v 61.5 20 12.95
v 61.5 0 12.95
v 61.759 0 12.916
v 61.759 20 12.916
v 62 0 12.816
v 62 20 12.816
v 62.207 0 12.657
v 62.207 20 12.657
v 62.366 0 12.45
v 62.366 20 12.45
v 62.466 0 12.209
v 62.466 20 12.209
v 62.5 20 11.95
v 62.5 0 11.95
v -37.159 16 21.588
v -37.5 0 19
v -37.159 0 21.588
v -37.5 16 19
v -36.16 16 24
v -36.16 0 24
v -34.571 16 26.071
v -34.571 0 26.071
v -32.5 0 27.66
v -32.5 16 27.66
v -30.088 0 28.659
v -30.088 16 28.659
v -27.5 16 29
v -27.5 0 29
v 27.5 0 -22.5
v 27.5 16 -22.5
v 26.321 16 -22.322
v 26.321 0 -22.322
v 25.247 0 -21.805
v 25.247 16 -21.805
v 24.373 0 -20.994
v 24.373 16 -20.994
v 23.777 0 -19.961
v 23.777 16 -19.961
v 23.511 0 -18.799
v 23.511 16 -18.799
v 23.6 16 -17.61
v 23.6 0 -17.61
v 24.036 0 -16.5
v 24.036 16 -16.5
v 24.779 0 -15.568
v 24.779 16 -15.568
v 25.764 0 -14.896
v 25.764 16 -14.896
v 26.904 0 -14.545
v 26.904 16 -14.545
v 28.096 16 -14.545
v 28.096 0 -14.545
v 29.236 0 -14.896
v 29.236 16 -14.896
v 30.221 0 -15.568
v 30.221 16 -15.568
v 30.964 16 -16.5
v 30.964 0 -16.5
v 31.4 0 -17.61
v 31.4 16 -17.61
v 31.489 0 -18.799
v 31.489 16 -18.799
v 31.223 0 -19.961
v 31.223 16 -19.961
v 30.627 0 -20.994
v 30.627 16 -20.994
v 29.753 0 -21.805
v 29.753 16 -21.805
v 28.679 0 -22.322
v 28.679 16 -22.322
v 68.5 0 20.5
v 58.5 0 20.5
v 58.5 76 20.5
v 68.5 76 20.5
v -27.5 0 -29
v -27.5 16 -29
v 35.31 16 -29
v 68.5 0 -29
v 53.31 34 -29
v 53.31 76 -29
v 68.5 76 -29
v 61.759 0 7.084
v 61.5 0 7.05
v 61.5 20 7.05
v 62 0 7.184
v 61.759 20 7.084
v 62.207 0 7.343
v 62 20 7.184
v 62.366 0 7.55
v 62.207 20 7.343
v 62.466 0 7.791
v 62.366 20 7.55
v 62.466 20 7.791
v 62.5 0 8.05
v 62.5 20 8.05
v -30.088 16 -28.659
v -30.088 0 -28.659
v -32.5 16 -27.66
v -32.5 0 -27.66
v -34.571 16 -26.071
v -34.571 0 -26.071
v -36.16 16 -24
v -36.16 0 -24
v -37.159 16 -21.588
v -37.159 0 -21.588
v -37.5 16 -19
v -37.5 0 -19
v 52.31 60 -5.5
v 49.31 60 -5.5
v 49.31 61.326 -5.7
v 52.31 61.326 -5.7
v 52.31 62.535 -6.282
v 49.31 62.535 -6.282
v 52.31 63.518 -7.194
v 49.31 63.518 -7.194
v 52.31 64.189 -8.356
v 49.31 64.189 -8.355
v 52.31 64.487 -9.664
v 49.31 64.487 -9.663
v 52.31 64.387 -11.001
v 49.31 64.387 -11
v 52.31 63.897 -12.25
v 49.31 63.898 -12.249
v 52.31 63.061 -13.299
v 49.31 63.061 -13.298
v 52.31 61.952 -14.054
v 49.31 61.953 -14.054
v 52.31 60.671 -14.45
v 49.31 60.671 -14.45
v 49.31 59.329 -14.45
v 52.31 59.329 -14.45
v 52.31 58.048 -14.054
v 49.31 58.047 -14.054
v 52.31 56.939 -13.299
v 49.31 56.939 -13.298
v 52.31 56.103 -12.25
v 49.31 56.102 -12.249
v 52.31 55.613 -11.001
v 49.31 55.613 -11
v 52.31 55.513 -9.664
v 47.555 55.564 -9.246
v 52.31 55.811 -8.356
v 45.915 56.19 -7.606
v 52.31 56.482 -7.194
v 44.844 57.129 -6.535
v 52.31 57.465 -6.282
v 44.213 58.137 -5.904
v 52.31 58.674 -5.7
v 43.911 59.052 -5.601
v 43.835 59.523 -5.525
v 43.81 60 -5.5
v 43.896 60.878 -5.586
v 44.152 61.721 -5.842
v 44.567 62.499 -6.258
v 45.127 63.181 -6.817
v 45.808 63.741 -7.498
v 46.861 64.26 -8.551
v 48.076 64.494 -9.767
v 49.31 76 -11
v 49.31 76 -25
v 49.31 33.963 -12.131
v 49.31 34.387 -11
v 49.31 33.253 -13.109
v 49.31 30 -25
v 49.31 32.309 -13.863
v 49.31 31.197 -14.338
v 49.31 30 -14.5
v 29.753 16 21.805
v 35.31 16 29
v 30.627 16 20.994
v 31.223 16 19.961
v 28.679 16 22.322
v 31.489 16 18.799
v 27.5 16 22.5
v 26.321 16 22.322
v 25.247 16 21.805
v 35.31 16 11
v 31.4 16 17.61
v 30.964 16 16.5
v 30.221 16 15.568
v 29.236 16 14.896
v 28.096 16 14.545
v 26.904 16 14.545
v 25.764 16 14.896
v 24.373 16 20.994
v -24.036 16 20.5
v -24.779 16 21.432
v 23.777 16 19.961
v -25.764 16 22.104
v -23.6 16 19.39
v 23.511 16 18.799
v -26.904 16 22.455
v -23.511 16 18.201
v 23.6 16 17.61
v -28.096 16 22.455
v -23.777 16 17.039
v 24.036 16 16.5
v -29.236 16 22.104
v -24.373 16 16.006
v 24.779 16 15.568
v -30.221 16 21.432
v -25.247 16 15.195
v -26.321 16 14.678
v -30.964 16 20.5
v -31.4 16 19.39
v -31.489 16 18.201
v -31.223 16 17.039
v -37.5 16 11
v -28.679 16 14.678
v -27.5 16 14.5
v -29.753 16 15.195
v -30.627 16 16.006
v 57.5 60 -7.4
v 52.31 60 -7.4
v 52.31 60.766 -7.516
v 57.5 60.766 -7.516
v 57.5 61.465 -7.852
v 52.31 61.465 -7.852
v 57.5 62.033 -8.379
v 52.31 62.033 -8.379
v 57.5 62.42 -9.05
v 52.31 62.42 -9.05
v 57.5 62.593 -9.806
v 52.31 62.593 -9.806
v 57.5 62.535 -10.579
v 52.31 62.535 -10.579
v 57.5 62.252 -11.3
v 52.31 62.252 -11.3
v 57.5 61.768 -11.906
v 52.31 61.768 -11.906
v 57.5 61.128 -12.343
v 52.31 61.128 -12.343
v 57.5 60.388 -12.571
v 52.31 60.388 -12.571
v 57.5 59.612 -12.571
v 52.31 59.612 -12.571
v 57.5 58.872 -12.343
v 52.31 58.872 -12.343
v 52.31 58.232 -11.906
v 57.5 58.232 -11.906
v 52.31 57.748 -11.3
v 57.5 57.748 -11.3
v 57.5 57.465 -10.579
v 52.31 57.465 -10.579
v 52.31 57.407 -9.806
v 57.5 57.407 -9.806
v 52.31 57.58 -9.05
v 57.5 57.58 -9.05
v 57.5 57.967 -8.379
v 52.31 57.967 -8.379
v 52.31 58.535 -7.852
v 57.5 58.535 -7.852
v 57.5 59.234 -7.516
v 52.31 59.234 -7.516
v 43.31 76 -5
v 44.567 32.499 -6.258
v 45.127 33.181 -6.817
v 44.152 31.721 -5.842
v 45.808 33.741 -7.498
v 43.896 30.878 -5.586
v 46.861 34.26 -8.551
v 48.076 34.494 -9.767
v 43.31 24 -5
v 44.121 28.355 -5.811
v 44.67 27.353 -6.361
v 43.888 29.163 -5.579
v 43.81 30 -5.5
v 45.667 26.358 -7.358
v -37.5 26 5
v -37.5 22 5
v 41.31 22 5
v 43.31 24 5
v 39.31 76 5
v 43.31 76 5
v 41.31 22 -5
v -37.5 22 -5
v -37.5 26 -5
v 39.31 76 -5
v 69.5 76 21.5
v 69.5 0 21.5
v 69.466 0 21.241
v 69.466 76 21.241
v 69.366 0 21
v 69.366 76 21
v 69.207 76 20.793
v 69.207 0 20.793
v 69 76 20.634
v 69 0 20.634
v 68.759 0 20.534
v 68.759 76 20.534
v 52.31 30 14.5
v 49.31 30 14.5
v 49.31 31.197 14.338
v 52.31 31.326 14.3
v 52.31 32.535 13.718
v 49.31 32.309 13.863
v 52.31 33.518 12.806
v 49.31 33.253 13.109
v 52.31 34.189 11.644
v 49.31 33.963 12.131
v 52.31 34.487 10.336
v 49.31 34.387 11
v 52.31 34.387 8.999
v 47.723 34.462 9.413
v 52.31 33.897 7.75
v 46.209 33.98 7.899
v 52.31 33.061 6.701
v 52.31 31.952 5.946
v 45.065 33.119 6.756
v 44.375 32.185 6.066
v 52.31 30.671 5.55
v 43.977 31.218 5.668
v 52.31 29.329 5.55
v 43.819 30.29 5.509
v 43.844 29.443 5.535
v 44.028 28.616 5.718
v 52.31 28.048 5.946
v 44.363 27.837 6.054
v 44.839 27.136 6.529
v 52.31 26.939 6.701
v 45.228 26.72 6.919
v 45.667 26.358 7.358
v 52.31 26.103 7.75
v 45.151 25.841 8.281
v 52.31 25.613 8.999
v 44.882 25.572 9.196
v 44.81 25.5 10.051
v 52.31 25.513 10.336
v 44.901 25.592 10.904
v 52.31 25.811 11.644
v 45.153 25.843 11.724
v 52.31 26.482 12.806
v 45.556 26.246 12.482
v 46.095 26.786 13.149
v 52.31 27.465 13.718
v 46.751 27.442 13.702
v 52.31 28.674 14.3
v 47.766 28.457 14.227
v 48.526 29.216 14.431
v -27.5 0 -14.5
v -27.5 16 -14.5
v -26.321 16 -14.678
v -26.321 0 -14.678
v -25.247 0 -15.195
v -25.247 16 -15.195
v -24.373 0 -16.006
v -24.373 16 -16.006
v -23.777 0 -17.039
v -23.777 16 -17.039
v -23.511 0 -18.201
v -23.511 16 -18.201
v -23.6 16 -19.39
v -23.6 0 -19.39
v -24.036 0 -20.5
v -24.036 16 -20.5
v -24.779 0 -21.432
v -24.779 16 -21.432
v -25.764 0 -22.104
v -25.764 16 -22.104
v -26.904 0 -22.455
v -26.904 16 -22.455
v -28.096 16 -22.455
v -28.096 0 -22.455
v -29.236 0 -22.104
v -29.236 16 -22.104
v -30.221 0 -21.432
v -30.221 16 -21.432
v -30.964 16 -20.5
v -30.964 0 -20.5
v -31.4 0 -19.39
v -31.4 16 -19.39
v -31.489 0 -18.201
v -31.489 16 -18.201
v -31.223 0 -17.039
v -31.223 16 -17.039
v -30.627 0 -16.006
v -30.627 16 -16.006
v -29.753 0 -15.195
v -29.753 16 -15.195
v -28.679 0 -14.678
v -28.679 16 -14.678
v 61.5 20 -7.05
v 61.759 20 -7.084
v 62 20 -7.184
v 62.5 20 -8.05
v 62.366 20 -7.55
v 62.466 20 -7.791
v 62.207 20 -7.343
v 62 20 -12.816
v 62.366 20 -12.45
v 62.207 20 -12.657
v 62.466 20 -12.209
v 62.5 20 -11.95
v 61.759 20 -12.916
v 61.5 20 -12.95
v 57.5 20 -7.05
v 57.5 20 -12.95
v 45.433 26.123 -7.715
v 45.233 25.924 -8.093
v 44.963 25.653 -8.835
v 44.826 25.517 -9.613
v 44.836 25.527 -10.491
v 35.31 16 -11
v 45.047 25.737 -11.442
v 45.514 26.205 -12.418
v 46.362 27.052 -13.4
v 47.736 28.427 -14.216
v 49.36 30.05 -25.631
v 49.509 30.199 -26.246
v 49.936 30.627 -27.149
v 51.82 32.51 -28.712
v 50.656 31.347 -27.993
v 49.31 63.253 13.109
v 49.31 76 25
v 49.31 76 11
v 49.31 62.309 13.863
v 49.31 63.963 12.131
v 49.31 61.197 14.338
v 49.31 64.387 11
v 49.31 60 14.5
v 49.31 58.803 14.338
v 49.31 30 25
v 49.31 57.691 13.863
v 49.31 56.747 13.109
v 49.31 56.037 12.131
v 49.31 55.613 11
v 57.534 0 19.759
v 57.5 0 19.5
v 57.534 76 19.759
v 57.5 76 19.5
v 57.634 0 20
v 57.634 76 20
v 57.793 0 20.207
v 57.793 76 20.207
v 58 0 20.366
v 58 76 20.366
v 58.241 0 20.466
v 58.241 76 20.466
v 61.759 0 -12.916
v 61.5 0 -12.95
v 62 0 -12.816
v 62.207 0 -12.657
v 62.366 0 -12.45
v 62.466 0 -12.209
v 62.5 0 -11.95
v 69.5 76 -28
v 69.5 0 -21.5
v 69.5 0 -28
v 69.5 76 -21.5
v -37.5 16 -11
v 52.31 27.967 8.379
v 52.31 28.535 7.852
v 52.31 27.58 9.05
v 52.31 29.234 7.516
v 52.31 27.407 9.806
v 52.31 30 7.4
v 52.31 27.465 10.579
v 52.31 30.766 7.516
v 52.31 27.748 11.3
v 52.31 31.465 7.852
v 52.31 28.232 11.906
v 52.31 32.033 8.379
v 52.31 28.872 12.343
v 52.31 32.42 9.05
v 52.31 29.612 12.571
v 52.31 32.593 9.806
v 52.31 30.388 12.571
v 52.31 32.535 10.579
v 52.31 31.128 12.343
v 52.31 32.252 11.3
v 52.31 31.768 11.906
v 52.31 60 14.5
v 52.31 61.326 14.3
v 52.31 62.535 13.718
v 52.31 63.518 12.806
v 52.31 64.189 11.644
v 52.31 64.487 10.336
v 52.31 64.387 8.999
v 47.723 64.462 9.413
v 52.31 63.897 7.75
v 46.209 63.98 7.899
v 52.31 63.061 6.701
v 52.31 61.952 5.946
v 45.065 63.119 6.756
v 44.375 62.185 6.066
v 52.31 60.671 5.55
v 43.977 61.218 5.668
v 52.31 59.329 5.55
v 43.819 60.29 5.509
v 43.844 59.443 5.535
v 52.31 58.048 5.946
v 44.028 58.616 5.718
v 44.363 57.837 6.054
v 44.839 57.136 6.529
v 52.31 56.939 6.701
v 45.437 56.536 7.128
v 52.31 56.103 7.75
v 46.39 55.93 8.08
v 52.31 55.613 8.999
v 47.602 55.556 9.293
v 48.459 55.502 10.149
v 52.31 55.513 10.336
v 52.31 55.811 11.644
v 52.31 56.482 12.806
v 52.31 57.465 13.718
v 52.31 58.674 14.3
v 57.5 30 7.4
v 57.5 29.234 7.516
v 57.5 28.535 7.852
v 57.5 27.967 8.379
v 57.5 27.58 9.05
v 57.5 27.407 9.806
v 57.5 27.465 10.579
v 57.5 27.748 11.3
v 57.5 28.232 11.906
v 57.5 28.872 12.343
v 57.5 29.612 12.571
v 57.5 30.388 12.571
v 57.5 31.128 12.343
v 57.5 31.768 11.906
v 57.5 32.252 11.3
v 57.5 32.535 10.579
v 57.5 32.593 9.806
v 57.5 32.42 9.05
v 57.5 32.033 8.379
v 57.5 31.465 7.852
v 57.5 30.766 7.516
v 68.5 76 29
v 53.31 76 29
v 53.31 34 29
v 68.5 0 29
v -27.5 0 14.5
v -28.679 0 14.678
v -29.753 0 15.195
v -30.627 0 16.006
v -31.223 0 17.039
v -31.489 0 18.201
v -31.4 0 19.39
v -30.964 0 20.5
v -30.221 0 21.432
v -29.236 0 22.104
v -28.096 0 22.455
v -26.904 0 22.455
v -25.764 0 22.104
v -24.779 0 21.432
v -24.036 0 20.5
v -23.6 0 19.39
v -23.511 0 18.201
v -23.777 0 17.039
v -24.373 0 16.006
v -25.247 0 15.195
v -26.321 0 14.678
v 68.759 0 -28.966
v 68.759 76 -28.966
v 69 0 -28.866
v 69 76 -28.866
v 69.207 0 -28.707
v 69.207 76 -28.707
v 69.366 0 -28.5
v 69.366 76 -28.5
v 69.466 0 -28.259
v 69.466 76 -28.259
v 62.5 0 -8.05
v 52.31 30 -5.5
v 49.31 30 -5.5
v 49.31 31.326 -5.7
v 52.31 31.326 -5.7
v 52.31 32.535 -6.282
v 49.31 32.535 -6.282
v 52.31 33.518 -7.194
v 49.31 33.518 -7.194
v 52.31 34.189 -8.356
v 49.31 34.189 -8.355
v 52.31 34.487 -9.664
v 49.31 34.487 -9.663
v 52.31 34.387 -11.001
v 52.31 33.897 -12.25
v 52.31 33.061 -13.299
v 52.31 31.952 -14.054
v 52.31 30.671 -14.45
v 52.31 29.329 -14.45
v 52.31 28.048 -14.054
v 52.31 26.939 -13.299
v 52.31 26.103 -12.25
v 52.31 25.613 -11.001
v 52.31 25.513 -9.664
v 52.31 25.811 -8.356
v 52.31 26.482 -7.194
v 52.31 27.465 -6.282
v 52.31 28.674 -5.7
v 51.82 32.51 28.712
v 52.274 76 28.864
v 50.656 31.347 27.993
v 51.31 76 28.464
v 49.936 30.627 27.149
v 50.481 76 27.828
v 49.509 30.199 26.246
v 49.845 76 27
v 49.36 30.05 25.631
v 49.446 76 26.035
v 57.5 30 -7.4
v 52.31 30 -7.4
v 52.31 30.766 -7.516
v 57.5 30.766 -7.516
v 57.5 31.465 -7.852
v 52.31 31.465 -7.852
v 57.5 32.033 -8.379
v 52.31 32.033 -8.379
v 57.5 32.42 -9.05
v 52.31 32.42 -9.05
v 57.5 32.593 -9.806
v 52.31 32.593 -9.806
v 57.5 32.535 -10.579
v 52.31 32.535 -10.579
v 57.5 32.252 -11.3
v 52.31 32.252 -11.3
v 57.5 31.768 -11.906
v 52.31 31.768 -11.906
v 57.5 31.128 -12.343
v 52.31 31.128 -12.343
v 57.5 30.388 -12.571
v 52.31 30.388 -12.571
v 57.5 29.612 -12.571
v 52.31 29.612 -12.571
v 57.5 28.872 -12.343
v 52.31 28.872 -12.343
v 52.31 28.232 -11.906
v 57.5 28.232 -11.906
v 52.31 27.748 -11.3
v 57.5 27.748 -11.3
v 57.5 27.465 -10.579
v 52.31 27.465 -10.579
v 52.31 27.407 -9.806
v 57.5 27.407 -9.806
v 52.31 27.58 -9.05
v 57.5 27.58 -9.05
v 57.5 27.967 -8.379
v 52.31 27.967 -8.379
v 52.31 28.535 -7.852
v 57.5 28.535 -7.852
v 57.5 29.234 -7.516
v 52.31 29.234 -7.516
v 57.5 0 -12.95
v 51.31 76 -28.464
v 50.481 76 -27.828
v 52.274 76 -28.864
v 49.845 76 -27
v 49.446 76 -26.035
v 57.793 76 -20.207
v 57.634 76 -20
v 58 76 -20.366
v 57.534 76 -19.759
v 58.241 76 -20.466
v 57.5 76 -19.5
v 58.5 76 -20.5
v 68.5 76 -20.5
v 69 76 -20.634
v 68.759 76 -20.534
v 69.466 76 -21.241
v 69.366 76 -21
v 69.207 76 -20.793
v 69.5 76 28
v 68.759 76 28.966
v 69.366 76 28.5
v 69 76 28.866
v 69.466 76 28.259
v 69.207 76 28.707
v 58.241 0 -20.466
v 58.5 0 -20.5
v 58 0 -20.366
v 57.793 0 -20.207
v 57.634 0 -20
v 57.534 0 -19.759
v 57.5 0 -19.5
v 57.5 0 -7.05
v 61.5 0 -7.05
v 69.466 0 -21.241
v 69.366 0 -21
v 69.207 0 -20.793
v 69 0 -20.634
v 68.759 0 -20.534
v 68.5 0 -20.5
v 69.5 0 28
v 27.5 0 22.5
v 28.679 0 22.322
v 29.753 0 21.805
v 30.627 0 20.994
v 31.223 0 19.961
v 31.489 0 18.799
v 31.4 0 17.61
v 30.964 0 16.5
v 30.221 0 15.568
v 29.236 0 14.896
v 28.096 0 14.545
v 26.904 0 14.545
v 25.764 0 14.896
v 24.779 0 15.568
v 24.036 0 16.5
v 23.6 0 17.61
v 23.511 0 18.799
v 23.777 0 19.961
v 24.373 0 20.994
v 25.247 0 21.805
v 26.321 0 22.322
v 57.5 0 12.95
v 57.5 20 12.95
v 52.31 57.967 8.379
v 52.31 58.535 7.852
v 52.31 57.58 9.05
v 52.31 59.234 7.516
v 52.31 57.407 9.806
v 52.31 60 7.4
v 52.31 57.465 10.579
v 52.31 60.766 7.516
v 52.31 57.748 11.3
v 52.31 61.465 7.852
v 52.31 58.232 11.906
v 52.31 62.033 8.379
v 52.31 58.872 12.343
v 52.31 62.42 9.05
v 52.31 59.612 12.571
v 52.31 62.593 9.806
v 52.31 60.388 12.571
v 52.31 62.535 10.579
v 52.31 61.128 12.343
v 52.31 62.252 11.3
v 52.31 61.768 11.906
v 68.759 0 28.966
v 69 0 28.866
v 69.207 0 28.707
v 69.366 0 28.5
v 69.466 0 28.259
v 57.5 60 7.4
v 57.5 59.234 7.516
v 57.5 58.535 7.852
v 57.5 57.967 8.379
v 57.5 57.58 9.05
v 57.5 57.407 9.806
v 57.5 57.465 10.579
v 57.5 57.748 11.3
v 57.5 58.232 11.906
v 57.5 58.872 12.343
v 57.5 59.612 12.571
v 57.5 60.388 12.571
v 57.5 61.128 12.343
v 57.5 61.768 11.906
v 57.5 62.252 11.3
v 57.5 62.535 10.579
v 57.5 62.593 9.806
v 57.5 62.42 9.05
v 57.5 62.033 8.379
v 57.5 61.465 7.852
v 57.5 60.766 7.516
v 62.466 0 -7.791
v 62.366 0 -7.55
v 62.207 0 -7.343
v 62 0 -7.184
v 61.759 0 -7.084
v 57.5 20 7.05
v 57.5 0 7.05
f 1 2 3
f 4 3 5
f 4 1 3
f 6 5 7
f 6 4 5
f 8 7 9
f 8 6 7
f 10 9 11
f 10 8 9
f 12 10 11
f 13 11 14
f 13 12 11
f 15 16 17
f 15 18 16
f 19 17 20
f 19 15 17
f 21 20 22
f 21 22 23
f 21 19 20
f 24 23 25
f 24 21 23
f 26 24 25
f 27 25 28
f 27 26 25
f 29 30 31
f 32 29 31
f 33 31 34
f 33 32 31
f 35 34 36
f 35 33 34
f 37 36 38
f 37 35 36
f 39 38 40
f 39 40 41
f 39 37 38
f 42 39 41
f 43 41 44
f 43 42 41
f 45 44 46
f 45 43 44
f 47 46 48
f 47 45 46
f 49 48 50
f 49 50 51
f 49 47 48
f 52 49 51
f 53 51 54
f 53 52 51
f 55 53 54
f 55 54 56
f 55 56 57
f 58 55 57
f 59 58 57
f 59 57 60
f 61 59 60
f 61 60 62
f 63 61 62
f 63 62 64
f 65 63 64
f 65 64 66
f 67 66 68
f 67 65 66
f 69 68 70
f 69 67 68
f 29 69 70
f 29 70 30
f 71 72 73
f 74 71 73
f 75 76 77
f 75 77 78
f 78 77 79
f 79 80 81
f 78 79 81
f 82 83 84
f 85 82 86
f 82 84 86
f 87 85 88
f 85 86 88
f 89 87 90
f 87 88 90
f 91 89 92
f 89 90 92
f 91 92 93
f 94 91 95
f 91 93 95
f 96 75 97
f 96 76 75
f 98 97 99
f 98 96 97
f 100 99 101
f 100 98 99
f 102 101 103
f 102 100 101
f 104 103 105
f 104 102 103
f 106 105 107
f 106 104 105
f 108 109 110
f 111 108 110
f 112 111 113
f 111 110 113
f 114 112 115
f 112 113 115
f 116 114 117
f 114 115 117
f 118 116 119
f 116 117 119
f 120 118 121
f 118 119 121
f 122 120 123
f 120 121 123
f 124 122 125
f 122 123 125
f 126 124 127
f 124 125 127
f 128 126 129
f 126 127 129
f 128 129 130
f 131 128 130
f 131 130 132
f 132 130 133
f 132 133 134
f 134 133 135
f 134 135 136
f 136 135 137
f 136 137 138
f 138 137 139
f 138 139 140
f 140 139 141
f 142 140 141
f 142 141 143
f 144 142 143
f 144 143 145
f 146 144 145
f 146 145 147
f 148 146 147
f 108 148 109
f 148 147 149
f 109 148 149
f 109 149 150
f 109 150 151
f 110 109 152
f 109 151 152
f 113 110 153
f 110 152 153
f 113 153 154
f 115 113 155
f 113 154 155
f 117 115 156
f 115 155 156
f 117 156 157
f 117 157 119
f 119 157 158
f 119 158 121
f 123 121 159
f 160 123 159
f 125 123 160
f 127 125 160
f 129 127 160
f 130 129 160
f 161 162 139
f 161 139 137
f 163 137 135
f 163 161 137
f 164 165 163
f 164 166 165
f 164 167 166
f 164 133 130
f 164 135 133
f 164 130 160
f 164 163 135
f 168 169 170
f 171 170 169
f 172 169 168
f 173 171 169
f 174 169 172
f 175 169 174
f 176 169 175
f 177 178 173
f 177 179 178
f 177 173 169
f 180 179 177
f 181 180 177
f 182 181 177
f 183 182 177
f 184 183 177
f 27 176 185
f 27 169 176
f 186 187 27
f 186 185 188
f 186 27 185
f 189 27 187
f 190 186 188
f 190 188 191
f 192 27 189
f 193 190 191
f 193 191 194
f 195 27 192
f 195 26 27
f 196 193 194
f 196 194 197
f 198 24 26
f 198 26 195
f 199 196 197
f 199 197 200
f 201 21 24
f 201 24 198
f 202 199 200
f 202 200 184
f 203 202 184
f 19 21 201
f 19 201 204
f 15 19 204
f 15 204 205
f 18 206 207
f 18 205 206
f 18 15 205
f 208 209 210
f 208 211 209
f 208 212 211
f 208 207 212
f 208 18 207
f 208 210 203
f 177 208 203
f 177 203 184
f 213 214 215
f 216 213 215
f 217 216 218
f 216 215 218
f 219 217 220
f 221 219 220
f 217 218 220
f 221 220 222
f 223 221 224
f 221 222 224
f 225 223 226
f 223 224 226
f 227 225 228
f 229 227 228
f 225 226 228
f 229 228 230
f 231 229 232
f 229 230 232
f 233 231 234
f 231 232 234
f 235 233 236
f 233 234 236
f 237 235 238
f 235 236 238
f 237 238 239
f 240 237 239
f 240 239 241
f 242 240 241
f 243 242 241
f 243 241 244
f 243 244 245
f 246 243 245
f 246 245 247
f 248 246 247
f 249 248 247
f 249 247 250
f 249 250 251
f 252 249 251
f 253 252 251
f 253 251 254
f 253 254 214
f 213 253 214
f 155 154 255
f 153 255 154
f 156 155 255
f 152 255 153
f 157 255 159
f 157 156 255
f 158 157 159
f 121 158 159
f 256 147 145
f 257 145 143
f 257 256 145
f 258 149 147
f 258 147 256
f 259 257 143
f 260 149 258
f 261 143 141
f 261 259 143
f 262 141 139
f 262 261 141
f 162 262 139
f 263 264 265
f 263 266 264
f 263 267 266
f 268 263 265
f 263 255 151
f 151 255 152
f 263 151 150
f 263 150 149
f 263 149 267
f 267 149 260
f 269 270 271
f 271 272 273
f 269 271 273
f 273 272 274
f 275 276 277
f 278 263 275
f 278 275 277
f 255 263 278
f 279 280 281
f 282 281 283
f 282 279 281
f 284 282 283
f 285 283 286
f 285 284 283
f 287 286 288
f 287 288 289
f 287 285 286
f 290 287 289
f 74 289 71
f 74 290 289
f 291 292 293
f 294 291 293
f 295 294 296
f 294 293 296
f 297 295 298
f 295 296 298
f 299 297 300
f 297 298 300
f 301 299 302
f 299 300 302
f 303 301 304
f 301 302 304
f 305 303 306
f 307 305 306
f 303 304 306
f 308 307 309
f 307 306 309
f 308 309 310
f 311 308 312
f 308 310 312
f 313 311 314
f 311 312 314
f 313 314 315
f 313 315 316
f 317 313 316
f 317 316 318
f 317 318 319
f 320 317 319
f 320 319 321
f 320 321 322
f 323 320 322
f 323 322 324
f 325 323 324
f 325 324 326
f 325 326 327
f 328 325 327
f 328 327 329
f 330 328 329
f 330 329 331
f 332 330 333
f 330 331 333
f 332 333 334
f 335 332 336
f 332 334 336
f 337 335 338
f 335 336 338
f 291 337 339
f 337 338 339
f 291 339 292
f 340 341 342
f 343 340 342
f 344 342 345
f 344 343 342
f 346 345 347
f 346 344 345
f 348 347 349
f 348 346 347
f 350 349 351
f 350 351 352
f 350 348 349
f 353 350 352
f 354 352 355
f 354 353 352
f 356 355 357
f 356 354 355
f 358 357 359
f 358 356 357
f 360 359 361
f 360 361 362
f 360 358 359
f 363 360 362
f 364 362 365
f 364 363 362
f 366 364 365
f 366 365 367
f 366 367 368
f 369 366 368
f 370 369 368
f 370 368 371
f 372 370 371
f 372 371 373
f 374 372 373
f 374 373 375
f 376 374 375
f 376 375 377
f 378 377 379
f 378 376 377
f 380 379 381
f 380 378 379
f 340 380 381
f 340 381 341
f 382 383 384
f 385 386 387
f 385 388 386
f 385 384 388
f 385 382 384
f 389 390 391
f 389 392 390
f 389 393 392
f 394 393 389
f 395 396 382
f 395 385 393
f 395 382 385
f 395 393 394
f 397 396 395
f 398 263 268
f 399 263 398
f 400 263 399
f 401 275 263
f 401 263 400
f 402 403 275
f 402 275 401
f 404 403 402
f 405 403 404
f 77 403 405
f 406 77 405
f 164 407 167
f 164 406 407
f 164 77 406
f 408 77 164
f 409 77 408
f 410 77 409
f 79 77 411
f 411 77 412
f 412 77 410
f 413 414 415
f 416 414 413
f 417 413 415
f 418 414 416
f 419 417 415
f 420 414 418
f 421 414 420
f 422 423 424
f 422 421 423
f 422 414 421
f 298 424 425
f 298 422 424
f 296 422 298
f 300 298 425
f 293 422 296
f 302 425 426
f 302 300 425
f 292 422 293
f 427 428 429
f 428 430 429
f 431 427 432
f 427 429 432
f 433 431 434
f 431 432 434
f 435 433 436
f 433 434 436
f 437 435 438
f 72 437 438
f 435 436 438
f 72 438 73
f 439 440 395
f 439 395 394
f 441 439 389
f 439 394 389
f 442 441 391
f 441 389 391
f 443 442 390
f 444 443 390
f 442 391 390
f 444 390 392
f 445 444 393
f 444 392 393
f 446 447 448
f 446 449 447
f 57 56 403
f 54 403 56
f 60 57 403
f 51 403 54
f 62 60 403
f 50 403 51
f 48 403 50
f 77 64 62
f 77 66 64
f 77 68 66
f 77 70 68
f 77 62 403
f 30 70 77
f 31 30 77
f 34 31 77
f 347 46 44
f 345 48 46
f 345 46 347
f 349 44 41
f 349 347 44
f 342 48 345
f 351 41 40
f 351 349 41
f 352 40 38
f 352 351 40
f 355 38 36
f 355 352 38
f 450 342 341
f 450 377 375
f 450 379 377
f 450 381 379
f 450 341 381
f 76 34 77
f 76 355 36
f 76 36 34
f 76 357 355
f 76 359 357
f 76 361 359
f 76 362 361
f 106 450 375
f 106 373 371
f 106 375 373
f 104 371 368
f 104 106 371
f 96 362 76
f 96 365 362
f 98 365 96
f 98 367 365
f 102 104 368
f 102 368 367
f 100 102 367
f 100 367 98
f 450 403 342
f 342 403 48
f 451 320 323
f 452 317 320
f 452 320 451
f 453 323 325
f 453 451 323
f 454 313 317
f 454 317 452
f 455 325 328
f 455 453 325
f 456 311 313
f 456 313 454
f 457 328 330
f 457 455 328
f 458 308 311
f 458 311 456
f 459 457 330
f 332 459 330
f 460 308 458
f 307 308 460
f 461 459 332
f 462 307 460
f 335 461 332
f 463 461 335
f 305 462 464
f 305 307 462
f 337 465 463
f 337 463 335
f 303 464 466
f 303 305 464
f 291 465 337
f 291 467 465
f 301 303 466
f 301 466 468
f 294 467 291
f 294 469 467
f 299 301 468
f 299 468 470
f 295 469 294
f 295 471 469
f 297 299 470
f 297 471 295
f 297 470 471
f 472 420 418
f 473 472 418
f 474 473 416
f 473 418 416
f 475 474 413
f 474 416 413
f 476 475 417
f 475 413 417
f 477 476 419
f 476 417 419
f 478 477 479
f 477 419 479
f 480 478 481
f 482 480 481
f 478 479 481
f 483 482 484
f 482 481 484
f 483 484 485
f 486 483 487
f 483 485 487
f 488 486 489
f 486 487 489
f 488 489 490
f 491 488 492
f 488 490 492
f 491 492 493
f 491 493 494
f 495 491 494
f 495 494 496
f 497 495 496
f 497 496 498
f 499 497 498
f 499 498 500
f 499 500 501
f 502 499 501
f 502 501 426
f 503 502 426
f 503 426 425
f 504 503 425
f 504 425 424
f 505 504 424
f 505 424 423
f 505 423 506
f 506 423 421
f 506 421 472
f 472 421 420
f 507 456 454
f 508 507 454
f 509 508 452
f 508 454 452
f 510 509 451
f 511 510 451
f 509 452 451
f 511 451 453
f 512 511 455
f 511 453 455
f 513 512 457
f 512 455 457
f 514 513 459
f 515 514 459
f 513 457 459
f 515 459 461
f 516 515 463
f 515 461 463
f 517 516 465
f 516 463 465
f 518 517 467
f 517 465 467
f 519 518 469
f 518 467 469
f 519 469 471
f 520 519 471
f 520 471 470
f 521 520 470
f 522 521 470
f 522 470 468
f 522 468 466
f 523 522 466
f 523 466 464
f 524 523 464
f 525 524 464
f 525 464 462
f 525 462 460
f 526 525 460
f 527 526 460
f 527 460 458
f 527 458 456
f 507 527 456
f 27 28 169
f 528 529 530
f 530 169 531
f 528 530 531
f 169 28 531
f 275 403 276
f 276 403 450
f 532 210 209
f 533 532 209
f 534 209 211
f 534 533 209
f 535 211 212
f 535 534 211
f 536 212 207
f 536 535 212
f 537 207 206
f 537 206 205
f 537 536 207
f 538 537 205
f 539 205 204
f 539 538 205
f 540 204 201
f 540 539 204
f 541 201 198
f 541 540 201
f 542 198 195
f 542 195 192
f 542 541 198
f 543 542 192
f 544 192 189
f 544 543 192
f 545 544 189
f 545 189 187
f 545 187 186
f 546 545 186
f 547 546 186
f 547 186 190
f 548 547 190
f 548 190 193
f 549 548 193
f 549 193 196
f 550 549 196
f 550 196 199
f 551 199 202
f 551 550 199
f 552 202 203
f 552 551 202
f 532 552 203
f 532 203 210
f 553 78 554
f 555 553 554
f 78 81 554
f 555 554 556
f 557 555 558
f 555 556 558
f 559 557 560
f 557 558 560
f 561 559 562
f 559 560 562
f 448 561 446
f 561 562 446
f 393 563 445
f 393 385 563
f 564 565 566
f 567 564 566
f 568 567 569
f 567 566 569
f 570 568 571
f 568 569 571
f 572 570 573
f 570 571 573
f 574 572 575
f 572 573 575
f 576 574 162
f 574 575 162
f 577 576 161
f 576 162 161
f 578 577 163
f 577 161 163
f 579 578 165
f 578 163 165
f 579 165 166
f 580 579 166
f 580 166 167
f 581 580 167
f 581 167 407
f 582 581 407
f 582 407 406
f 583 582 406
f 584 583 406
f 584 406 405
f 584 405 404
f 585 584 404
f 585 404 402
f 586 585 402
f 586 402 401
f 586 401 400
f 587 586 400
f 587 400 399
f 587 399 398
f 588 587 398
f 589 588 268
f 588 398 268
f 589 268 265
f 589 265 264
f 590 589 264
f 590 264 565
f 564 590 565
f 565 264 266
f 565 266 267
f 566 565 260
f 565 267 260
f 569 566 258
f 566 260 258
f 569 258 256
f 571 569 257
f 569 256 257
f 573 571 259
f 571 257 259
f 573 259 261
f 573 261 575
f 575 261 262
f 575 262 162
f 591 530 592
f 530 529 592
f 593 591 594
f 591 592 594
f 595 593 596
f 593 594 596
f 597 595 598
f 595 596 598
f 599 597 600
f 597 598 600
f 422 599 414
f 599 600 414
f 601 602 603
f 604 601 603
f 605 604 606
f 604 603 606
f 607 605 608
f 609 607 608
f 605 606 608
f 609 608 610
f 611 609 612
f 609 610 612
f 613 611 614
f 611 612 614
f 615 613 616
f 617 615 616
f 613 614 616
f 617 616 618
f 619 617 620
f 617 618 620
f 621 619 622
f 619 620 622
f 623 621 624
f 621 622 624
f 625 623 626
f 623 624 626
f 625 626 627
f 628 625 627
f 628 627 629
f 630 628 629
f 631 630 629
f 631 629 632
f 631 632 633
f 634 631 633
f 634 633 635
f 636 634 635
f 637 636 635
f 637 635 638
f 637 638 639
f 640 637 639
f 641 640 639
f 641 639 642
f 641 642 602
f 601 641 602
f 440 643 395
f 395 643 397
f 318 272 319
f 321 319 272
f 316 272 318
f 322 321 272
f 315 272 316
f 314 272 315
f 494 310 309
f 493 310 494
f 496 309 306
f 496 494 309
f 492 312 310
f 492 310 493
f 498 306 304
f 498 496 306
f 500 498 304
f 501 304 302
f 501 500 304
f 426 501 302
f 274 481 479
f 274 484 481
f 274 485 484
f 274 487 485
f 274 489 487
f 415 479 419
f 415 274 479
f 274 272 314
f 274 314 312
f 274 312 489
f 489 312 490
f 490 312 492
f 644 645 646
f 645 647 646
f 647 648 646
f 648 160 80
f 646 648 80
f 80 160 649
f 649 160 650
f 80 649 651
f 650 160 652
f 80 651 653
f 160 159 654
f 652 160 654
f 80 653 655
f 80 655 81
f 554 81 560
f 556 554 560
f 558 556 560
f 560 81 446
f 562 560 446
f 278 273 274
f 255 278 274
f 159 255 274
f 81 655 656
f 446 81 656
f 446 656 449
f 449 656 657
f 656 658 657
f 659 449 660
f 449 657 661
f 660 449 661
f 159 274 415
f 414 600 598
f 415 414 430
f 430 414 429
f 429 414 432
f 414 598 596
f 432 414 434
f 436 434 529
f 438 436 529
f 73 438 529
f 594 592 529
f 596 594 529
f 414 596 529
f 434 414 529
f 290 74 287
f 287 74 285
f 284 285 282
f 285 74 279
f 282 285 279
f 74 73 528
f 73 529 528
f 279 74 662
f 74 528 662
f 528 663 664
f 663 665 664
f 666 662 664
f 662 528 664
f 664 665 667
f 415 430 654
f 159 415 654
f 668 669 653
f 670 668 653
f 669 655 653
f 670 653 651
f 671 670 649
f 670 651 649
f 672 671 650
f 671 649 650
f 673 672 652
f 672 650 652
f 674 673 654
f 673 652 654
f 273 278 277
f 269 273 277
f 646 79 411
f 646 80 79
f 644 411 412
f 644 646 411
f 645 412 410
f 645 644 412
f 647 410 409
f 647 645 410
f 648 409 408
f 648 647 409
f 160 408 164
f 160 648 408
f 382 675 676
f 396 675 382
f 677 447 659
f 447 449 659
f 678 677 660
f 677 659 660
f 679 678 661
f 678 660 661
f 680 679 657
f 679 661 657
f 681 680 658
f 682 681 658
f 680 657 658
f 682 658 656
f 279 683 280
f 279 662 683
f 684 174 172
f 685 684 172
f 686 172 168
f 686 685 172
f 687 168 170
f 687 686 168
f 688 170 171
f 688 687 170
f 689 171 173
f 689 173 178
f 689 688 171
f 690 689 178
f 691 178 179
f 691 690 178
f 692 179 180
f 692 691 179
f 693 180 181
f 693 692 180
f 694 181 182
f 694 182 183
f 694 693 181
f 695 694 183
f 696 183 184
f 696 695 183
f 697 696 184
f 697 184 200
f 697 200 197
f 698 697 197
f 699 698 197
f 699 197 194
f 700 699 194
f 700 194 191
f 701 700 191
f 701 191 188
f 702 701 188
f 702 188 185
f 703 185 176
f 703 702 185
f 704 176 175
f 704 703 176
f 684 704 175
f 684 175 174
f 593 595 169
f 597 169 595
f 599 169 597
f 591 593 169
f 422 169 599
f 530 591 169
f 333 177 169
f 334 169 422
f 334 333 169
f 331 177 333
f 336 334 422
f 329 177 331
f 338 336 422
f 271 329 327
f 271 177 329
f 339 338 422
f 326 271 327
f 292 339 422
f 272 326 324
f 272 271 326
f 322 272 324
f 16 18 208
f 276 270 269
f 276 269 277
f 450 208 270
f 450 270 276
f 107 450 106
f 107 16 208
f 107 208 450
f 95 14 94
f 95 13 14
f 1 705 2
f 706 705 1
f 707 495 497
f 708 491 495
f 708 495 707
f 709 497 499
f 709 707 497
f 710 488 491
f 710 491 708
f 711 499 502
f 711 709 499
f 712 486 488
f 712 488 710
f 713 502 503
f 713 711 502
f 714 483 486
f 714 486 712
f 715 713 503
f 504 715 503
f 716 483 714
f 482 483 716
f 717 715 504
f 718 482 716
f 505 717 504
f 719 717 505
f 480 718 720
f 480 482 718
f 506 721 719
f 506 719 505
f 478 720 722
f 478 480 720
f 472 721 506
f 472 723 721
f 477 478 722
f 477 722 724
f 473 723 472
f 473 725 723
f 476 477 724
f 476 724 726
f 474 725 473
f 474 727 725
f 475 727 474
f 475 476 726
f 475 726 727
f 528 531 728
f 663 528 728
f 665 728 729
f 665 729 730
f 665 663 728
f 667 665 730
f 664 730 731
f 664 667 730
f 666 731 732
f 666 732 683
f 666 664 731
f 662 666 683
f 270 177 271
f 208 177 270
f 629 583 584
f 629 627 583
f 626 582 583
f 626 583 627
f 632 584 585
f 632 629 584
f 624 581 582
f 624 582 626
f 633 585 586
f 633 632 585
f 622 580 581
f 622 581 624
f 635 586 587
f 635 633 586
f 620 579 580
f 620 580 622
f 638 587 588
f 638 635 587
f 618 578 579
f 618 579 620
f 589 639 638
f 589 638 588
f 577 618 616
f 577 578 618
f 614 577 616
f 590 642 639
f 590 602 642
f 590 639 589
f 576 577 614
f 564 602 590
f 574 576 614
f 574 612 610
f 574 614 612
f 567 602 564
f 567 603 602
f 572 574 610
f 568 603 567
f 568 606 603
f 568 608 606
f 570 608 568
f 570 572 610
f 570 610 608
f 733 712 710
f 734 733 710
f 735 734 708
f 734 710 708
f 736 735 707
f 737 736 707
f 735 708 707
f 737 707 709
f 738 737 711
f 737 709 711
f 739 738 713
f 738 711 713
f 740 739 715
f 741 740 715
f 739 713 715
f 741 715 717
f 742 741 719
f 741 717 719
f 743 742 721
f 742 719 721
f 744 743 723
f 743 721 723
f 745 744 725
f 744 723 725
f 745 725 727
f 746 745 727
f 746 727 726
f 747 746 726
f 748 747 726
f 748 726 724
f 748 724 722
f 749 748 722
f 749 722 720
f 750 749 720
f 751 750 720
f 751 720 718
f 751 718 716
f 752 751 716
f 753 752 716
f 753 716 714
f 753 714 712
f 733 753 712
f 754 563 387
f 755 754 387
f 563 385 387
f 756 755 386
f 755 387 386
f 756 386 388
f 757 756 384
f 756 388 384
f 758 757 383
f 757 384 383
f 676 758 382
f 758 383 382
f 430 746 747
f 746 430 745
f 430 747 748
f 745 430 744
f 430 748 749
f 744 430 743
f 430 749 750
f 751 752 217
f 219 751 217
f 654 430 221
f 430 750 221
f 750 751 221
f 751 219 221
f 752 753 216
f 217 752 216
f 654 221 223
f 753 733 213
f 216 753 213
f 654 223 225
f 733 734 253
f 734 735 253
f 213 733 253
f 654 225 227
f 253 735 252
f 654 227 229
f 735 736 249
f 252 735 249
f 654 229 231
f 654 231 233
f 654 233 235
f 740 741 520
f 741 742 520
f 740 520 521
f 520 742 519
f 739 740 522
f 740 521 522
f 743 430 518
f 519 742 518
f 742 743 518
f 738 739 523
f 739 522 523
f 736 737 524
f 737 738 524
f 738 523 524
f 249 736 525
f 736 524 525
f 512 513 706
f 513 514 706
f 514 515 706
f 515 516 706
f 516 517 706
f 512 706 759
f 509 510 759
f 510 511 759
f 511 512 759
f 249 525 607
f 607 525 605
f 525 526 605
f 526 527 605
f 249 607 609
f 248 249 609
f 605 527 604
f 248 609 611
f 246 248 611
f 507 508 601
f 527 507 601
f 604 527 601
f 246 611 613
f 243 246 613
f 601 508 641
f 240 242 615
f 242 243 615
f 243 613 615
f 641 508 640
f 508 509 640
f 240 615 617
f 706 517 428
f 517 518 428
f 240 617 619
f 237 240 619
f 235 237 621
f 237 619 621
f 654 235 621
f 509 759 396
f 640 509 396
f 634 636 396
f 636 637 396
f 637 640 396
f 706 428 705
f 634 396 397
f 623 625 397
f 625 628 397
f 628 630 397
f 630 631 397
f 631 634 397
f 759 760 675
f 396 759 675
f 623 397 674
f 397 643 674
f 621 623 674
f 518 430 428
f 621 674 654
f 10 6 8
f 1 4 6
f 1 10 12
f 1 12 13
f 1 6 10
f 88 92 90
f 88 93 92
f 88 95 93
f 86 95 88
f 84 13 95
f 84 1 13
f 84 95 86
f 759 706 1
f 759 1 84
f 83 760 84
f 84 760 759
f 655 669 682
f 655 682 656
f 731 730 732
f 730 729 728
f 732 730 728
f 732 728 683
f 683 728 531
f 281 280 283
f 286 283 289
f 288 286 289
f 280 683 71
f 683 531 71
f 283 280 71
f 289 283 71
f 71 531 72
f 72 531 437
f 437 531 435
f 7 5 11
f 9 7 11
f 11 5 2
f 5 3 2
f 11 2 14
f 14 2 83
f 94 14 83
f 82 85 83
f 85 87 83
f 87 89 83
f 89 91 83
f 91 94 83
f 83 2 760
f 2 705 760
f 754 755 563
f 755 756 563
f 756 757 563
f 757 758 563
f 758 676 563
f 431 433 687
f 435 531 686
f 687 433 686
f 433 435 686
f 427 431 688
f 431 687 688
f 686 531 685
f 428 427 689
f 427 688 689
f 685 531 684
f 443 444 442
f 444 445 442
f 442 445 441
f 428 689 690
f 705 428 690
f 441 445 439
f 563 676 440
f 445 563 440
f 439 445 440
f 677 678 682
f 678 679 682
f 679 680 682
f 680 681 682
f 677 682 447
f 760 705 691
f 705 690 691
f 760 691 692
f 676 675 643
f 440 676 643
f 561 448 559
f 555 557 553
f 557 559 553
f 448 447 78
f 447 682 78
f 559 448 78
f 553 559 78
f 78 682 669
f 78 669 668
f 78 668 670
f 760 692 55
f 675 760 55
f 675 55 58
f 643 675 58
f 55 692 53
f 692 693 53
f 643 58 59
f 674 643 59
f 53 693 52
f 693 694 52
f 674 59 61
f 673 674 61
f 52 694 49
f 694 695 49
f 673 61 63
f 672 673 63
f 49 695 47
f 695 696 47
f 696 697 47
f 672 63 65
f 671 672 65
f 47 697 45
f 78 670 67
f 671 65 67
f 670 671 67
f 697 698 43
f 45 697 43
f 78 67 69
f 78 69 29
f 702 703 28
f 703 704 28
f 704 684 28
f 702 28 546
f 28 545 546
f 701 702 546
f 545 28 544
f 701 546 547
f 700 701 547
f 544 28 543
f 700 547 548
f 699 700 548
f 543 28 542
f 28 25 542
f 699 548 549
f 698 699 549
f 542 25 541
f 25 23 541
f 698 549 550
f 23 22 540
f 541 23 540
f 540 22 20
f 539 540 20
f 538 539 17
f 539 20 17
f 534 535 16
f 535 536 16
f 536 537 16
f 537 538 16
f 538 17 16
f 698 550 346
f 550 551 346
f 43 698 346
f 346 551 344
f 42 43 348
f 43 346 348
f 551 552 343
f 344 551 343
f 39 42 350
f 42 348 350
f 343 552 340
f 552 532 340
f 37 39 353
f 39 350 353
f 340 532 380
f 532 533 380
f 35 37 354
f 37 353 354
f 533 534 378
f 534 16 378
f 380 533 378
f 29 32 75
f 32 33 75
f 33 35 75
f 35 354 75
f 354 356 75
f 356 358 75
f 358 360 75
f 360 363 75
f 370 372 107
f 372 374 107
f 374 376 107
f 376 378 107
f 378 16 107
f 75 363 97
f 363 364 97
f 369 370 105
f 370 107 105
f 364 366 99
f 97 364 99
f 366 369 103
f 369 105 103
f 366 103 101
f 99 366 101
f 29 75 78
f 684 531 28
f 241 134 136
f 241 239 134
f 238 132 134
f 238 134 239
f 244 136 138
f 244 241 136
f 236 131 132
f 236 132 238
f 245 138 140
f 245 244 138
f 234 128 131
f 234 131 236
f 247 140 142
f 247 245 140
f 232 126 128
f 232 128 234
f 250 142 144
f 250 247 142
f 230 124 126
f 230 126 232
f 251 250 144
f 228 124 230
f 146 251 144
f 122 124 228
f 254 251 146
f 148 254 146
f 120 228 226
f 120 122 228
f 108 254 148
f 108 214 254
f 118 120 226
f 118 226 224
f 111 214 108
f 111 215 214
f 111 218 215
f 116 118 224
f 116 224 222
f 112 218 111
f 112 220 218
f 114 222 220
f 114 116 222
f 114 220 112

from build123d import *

# Parameters (mm, degrees)
ESQUISSE1_W             = 75
ESQUISSE1_H             = 58
ESQUISSE1_R             = 4
BOSS_EXTRU_1_DEPTH      = 16
ESQUISSE2_W             = 58
ESQUISSE2_H             = 16
BOSS_EXTRU_2_DEPTH      = 20
ESQUISSE3_W             = 8.190465892
ESQUISSE3_H             = 58
BOSS_EXTRU_3_DEPTH      = 60
ESQUISSE4_W             = 8.5
ESQUISSE4_H             = 76
BOSS_EXTRU_4_DEPTH      = 12
ESQUISSE5_W             = 5.9
ESQUISSE5_H             = 20
BOSS_EXTRU_5_DEPTH      = 5
ESQUISSE6_W             = 10
ESQUISSE6_H             = 60
BOSS_EXTRU_6_DEPTH      = 86.809534108
ESQUISSE7_R             = 2.6
ENL_V_MAT_EXTRU_1_DEPTH = 119.965941395
ESQUISSE8_R             = 4.5
ENL_V_MAT_EXTRU_2_DEPTH = 3
ENL_V_MAT_EXTRU_3_DEPTH = 109.45390726
CHANFREIN1_SIZE         = 14
CHANFREIN2_SIZE         = 6
CHANFREIN3_SIZE         = 6
CONG_1_R                = 10
CONG_2_R                = 4
CONG_3_R                = 1
CONG_4_R                = 1


with BuildPart() as part:
    # Esquisse1 → Boss.-Extru.1 (new body)
    with BuildSketch(Plane(origin=(0, 0, 0), x_dir=(1, 0, 0), z_dir=(0, 1, 0))):
        Rectangle(ESQUISSE1_W, ESQUISSE1_H)
        with Locations(Location((-27.5, 18.5, 0), (0, 0, 270))):
            Circle(ESQUISSE1_R, mode=Mode.SUBTRACT)
        with Locations(Location((27.5, 18.5, 0), (0, 0, 90))):
            Circle(ESQUISSE1_R, mode=Mode.SUBTRACT)
        with Locations(Location((27.5, -18.5, 0), (0, 0, 270))):
            Circle(ESQUISSE1_R, mode=Mode.SUBTRACT)
        with Locations(Location((-27.5, -18.5, 0), (0, 0, 90))):
            Circle(ESQUISSE1_R, mode=Mode.SUBTRACT)
    extrude(amount=BOSS_EXTRU_1_DEPTH)

    # Esquisse2 → Boss.-Extru.2 (add)
    with BuildSketch(Plane(origin=(37.5, 0, 0), x_dir=(0, 0, -1), z_dir=(1, 0, 0))):
        with Locations((0, 8)):
            Rectangle(ESQUISSE2_W, ESQUISSE2_H)
    extrude(amount=BOSS_EXTRU_2_DEPTH)

    # Esquisse3 → Boss.-Extru.3 (add)
    with BuildSketch(Plane(origin=(0, 16, 0), x_dir=(1, 0, 0), z_dir=(0, 1, 0))):
        with Locations((53.404767054, 0)):
            Rectangle(ESQUISSE3_W, ESQUISSE3_H)
    extrude(amount=BOSS_EXTRU_3_DEPTH)

    # Esquisse4 → Boss.-Extru.4 (add)
    with BuildSketch(Plane(origin=(57.5, 0, 0), x_dir=(0, 0, -1), z_dir=(1, 0, 0))):
        with Locations((24.75, 38)):
            Rectangle(ESQUISSE4_W, ESQUISSE4_H)
        with Locations((-24.75, 38)):
            Rectangle(ESQUISSE4_W, ESQUISSE4_H)
    extrude(amount=BOSS_EXTRU_4_DEPTH)

    # Esquisse5 → Boss.-Extru.5 (add)
    with BuildSketch(Plane(origin=(57.5, 0, 0), x_dir=(0, 0, -1), z_dir=(1, 0, 0))):
        with Locations((-10, 10)):
            Rectangle(ESQUISSE5_W, ESQUISSE5_H)
        with Locations((10, 10)):
            Rectangle(ESQUISSE5_W, ESQUISSE5_H)
    extrude(amount=BOSS_EXTRU_5_DEPTH)

    # Esquisse6 → Boss.-Extru.6 (add)
    with BuildSketch(Plane.ZY.offset(-49.309534108)):
        with Locations((0, 46)):
            Rectangle(ESQUISSE6_W, ESQUISSE6_H)
    extrude(amount=BOSS_EXTRU_6_DEPTH)

    # Esquisse7 → Enlèv. mat.-Extru.1 (cut, through all)
    with BuildSketch(Plane.ZY.offset(-49.309534108)):
        with Locations((-10, 60)):
            Circle(ESQUISSE7_R)
        with Locations((-10, 30)):
            Circle(ESQUISSE7_R)
        with Locations(Location((10, 30, 0), (0, 0, 180))):
            Circle(ESQUISSE7_R)
        with Locations(Location((10, 60, 0), (0, 0, 180))):
            Circle(ESQUISSE7_R)
    extrude(amount=-ENL_V_MAT_EXTRU_1_DEPTH, mode=Mode.SUBTRACT)

    # Esquisse8 → Enlèv. mat.-Extru.2 (cut)
    with BuildSketch(Plane.ZY.offset(-49.309534108)):
        with Locations((-10, 60)):
            Circle(ESQUISSE8_R)
        with Locations((-10, 30)):
            Circle(ESQUISSE8_R)
        with Locations((10, 60)):
            Circle(ESQUISSE8_R)
        with Locations((10, 30)):
            Circle(ESQUISSE8_R)
    extrude(amount=-ENL_V_MAT_EXTRU_2_DEPTH, mode=Mode.SUBTRACT)

    # Esquisse9 → Enlèv. mat.-Extru.3 (cut, through all)
    with BuildSketch(Plane(origin=(0, 0, -5), x_dir=(-1, 0, 0), z_dir=(0, 0, -1))):
        Polygon((-39.309534108, 76), (37.5, 26), (37.5, 76), align=None)
    extrude(amount=-ENL_V_MAT_EXTRU_3_DEPTH, mode=Mode.SUBTRACT)

    # Chanfrein1
    # the kernel refuses this chamfer: 14 mm, written as the material it adds along each edge
    with BuildSketch(Plane(origin=(49.309534108, 16, -31.003561832), x_dir=(-0.9996219169112968, -0.027495876610586358, 0), z_dir=(0, 0, 1))) as chanfrein1_piece_1_section:
        Polygon((CHANFREIN1_SIZE * 0.999621916911, -CHANFREIN1_SIZE * 0.0274958766106), (-CHANFREIN1_SIZE * 0.0274958766106, -CHANFREIN1_SIZE * 0.999621916911), (0, 0), align=None)
    chanfrein1_piece_1 = extrude(amount=60.003561832, mode=Mode.PRIVATE)
    chanfrein1_piece_1 = split(chanfrein1_piece_1, bisect_by=Plane(origin=(44.612270729, 20.464073152, -29), z_dir=(0, 0, 1)), keep=Keep.TOP, mode=Mode.PRIVATE)
    chanfrein1_piece_1 = chanfrein1_piece_1 - Plane(origin=(44.612270729, 30, -10), x_dir=(0, 0, 1), z_dir=(-1, 0, 0)) * Cylinder(4.5, 176, mode=Mode.PRIVATE)
    chanfrein1_piece_1 = chanfrein1_piece_1 - Plane(origin=(44.612270729, 30, 10), x_dir=(0, 0, 1), z_dir=(-1, 0, 0)) * Cylinder(4.5, 176, mode=Mode.PRIVATE)
    add(chanfrein1_piece_1)
    with BuildSketch(Plane(origin=(49.309534108, 16, -29), x_dir=(0.02749587661058661, 0.9996219169112968, 0), z_dir=(0, 0, 1))) as chanfrein1_piece_2_section:
        Polygon((CHANFREIN1_SIZE * 0.999621916911, CHANFREIN1_SIZE * 0.0274958766106), (-CHANFREIN1_SIZE * 0.0274958766106, CHANFREIN1_SIZE * 0.999621916911), (0, 0), align=None)
    chanfrein1_piece_2 = extrude(amount=60.003561832, mode=Mode.PRIVATE)
    chanfrein1_piece_2 = chanfrein1_piece_2 - Plane(origin=(44.577827309, 30, -10), x_dir=(0, 0, 1), z_dir=(-1, 0, 0)) * Cylinder(4.5, 176, mode=Mode.PRIVATE)
    chanfrein1_piece_2 = split(chanfrein1_piece_2, bisect_by=Plane(origin=(44.577827309, 20.39830905, 29), z_dir=(0, 0, -1)), keep=Keep.TOP, mode=Mode.PRIVATE)
    chanfrein1_piece_2 = chanfrein1_piece_2 - Plane(origin=(44.577827309, 30, 10), x_dir=(0, 0, 1), z_dir=(-1, 0, 0)) * Cylinder(4.5, 176, mode=Mode.PRIVATE)
    add(chanfrein1_piece_2)

    # Chanfrein2
    chanfrein2_edges = [part.edges().sort_by_distance(p)[0] for p in [
        (-1.095232946, 16, 5),
        (-1.095232946, 16, -5),
    ]]
    chamfer(chanfrein2_edges, length=CHANFREIN2_SIZE)

    # Chanfrein3
    # the kernel refuses this chamfer: 6 mm, written as the material it adds along each edge
    with BuildSketch(Plane(origin=(49.309534108, 76, 5), x_dir=(-0.9996219169112968, 0, -0.027495876610586334), z_dir=(0, -1, 0))) as chanfrein3_piece_1_section:
        Polygon((CHANFREIN3_SIZE * 0.999621916911, -CHANFREIN3_SIZE * 0.0274958766106), (-CHANFREIN3_SIZE * 0.0274958766106, -CHANFREIN3_SIZE * 0.999621916911), (0, 0), align=None)
    chanfrein3_piece_1 = extrude(amount=61.430097928, mode=Mode.PRIVATE)
    chanfrein3_piece_1 = chanfrein3_piece_1 - Plane(origin=(47.194482269, 30, 10), x_dir=(0, 0, 1), z_dir=(-1, 0, 0)) * Cylinder(4.5, 147, mode=Mode.PRIVATE)
    chanfrein3_piece_1 = chanfrein3_piece_1 - Plane(origin=(47.194482269, 60, 10), x_dir=(0, 0, 1), z_dir=(-1, 0, 0)) * Cylinder(4.5, 147, mode=Mode.PRIVATE)
    add(chanfrein3_piece_1)
    with BuildSketch(Plane(origin=(49.309534108, 14.569902072, -5), x_dir=(-0.9996219169112968, 0, 0.027495876610586334), z_dir=(0, 1, 0))) as chanfrein3_piece_2_section:
        Polygon((CHANFREIN3_SIZE * 0.999621916911, -CHANFREIN3_SIZE * 0.0274958766106), (-CHANFREIN3_SIZE * 0.0274958766106, -CHANFREIN3_SIZE * 0.999621916911), (0, 0), align=None)
    chanfrein3_piece_2 = extrude(amount=61.430097928, mode=Mode.PRIVATE)
    chanfrein3_piece_2 = chanfrein3_piece_2 - Plane(origin=(47.377575529, 30, -10), x_dir=(0, 0, 1), z_dir=(-1, 0, 0)) * Cylinder(4.5, 147, mode=Mode.PRIVATE)
    chanfrein3_piece_2 = chanfrein3_piece_2 - Plane(origin=(47.377575529, 60, -10), x_dir=(0, 0, 1), z_dir=(-1, 0, 0)) * Cylinder(4.5, 147, mode=Mode.PRIVATE)
    add(chanfrein3_piece_2)

    # Congé1
    cong_1_edges = [part.edges().sort_by_distance(p)[0] for p in [
        (-37.5, 8, -29),
        (-37.5, 8, 29),
    ]]
    fillet(cong_1_edges, radius=CONG_1_R)

    # Congé2
    cong_2_edges = [part.edges().sort_by_distance(p)[0] for p in [
        (49.309534108, 53, -29),
        (49.309534108, 53, 29),
    ]]
    fillet(cong_2_edges, radius=CONG_2_R)

    # Congé3
    cong_3_edges = [part.edges().sort_by_distance(p)[0] for p in [
        (69.5, 38, 29),
        (69.5, 38, 20.5),
        (69.5, 38, -20.5),
        (69.5, 38, -29),
    ]]
    fillet(cong_3_edges, radius=CONG_3_R)

    # Congé4
    cong_4_edges = [part.edges().sort_by_distance(p)[0] for p in [
        (57.5, 38, 20.5),
        (57.5, 38, -20.5),
        (62.5, 10, 12.95),
        (62.5, 10, 7.05),
        (62.5, 10, -7.05),
        (62.5, 10, -12.95),
    ]]
    fillet(cong_4_edges, radius=CONG_4_R)


solid = part.part
